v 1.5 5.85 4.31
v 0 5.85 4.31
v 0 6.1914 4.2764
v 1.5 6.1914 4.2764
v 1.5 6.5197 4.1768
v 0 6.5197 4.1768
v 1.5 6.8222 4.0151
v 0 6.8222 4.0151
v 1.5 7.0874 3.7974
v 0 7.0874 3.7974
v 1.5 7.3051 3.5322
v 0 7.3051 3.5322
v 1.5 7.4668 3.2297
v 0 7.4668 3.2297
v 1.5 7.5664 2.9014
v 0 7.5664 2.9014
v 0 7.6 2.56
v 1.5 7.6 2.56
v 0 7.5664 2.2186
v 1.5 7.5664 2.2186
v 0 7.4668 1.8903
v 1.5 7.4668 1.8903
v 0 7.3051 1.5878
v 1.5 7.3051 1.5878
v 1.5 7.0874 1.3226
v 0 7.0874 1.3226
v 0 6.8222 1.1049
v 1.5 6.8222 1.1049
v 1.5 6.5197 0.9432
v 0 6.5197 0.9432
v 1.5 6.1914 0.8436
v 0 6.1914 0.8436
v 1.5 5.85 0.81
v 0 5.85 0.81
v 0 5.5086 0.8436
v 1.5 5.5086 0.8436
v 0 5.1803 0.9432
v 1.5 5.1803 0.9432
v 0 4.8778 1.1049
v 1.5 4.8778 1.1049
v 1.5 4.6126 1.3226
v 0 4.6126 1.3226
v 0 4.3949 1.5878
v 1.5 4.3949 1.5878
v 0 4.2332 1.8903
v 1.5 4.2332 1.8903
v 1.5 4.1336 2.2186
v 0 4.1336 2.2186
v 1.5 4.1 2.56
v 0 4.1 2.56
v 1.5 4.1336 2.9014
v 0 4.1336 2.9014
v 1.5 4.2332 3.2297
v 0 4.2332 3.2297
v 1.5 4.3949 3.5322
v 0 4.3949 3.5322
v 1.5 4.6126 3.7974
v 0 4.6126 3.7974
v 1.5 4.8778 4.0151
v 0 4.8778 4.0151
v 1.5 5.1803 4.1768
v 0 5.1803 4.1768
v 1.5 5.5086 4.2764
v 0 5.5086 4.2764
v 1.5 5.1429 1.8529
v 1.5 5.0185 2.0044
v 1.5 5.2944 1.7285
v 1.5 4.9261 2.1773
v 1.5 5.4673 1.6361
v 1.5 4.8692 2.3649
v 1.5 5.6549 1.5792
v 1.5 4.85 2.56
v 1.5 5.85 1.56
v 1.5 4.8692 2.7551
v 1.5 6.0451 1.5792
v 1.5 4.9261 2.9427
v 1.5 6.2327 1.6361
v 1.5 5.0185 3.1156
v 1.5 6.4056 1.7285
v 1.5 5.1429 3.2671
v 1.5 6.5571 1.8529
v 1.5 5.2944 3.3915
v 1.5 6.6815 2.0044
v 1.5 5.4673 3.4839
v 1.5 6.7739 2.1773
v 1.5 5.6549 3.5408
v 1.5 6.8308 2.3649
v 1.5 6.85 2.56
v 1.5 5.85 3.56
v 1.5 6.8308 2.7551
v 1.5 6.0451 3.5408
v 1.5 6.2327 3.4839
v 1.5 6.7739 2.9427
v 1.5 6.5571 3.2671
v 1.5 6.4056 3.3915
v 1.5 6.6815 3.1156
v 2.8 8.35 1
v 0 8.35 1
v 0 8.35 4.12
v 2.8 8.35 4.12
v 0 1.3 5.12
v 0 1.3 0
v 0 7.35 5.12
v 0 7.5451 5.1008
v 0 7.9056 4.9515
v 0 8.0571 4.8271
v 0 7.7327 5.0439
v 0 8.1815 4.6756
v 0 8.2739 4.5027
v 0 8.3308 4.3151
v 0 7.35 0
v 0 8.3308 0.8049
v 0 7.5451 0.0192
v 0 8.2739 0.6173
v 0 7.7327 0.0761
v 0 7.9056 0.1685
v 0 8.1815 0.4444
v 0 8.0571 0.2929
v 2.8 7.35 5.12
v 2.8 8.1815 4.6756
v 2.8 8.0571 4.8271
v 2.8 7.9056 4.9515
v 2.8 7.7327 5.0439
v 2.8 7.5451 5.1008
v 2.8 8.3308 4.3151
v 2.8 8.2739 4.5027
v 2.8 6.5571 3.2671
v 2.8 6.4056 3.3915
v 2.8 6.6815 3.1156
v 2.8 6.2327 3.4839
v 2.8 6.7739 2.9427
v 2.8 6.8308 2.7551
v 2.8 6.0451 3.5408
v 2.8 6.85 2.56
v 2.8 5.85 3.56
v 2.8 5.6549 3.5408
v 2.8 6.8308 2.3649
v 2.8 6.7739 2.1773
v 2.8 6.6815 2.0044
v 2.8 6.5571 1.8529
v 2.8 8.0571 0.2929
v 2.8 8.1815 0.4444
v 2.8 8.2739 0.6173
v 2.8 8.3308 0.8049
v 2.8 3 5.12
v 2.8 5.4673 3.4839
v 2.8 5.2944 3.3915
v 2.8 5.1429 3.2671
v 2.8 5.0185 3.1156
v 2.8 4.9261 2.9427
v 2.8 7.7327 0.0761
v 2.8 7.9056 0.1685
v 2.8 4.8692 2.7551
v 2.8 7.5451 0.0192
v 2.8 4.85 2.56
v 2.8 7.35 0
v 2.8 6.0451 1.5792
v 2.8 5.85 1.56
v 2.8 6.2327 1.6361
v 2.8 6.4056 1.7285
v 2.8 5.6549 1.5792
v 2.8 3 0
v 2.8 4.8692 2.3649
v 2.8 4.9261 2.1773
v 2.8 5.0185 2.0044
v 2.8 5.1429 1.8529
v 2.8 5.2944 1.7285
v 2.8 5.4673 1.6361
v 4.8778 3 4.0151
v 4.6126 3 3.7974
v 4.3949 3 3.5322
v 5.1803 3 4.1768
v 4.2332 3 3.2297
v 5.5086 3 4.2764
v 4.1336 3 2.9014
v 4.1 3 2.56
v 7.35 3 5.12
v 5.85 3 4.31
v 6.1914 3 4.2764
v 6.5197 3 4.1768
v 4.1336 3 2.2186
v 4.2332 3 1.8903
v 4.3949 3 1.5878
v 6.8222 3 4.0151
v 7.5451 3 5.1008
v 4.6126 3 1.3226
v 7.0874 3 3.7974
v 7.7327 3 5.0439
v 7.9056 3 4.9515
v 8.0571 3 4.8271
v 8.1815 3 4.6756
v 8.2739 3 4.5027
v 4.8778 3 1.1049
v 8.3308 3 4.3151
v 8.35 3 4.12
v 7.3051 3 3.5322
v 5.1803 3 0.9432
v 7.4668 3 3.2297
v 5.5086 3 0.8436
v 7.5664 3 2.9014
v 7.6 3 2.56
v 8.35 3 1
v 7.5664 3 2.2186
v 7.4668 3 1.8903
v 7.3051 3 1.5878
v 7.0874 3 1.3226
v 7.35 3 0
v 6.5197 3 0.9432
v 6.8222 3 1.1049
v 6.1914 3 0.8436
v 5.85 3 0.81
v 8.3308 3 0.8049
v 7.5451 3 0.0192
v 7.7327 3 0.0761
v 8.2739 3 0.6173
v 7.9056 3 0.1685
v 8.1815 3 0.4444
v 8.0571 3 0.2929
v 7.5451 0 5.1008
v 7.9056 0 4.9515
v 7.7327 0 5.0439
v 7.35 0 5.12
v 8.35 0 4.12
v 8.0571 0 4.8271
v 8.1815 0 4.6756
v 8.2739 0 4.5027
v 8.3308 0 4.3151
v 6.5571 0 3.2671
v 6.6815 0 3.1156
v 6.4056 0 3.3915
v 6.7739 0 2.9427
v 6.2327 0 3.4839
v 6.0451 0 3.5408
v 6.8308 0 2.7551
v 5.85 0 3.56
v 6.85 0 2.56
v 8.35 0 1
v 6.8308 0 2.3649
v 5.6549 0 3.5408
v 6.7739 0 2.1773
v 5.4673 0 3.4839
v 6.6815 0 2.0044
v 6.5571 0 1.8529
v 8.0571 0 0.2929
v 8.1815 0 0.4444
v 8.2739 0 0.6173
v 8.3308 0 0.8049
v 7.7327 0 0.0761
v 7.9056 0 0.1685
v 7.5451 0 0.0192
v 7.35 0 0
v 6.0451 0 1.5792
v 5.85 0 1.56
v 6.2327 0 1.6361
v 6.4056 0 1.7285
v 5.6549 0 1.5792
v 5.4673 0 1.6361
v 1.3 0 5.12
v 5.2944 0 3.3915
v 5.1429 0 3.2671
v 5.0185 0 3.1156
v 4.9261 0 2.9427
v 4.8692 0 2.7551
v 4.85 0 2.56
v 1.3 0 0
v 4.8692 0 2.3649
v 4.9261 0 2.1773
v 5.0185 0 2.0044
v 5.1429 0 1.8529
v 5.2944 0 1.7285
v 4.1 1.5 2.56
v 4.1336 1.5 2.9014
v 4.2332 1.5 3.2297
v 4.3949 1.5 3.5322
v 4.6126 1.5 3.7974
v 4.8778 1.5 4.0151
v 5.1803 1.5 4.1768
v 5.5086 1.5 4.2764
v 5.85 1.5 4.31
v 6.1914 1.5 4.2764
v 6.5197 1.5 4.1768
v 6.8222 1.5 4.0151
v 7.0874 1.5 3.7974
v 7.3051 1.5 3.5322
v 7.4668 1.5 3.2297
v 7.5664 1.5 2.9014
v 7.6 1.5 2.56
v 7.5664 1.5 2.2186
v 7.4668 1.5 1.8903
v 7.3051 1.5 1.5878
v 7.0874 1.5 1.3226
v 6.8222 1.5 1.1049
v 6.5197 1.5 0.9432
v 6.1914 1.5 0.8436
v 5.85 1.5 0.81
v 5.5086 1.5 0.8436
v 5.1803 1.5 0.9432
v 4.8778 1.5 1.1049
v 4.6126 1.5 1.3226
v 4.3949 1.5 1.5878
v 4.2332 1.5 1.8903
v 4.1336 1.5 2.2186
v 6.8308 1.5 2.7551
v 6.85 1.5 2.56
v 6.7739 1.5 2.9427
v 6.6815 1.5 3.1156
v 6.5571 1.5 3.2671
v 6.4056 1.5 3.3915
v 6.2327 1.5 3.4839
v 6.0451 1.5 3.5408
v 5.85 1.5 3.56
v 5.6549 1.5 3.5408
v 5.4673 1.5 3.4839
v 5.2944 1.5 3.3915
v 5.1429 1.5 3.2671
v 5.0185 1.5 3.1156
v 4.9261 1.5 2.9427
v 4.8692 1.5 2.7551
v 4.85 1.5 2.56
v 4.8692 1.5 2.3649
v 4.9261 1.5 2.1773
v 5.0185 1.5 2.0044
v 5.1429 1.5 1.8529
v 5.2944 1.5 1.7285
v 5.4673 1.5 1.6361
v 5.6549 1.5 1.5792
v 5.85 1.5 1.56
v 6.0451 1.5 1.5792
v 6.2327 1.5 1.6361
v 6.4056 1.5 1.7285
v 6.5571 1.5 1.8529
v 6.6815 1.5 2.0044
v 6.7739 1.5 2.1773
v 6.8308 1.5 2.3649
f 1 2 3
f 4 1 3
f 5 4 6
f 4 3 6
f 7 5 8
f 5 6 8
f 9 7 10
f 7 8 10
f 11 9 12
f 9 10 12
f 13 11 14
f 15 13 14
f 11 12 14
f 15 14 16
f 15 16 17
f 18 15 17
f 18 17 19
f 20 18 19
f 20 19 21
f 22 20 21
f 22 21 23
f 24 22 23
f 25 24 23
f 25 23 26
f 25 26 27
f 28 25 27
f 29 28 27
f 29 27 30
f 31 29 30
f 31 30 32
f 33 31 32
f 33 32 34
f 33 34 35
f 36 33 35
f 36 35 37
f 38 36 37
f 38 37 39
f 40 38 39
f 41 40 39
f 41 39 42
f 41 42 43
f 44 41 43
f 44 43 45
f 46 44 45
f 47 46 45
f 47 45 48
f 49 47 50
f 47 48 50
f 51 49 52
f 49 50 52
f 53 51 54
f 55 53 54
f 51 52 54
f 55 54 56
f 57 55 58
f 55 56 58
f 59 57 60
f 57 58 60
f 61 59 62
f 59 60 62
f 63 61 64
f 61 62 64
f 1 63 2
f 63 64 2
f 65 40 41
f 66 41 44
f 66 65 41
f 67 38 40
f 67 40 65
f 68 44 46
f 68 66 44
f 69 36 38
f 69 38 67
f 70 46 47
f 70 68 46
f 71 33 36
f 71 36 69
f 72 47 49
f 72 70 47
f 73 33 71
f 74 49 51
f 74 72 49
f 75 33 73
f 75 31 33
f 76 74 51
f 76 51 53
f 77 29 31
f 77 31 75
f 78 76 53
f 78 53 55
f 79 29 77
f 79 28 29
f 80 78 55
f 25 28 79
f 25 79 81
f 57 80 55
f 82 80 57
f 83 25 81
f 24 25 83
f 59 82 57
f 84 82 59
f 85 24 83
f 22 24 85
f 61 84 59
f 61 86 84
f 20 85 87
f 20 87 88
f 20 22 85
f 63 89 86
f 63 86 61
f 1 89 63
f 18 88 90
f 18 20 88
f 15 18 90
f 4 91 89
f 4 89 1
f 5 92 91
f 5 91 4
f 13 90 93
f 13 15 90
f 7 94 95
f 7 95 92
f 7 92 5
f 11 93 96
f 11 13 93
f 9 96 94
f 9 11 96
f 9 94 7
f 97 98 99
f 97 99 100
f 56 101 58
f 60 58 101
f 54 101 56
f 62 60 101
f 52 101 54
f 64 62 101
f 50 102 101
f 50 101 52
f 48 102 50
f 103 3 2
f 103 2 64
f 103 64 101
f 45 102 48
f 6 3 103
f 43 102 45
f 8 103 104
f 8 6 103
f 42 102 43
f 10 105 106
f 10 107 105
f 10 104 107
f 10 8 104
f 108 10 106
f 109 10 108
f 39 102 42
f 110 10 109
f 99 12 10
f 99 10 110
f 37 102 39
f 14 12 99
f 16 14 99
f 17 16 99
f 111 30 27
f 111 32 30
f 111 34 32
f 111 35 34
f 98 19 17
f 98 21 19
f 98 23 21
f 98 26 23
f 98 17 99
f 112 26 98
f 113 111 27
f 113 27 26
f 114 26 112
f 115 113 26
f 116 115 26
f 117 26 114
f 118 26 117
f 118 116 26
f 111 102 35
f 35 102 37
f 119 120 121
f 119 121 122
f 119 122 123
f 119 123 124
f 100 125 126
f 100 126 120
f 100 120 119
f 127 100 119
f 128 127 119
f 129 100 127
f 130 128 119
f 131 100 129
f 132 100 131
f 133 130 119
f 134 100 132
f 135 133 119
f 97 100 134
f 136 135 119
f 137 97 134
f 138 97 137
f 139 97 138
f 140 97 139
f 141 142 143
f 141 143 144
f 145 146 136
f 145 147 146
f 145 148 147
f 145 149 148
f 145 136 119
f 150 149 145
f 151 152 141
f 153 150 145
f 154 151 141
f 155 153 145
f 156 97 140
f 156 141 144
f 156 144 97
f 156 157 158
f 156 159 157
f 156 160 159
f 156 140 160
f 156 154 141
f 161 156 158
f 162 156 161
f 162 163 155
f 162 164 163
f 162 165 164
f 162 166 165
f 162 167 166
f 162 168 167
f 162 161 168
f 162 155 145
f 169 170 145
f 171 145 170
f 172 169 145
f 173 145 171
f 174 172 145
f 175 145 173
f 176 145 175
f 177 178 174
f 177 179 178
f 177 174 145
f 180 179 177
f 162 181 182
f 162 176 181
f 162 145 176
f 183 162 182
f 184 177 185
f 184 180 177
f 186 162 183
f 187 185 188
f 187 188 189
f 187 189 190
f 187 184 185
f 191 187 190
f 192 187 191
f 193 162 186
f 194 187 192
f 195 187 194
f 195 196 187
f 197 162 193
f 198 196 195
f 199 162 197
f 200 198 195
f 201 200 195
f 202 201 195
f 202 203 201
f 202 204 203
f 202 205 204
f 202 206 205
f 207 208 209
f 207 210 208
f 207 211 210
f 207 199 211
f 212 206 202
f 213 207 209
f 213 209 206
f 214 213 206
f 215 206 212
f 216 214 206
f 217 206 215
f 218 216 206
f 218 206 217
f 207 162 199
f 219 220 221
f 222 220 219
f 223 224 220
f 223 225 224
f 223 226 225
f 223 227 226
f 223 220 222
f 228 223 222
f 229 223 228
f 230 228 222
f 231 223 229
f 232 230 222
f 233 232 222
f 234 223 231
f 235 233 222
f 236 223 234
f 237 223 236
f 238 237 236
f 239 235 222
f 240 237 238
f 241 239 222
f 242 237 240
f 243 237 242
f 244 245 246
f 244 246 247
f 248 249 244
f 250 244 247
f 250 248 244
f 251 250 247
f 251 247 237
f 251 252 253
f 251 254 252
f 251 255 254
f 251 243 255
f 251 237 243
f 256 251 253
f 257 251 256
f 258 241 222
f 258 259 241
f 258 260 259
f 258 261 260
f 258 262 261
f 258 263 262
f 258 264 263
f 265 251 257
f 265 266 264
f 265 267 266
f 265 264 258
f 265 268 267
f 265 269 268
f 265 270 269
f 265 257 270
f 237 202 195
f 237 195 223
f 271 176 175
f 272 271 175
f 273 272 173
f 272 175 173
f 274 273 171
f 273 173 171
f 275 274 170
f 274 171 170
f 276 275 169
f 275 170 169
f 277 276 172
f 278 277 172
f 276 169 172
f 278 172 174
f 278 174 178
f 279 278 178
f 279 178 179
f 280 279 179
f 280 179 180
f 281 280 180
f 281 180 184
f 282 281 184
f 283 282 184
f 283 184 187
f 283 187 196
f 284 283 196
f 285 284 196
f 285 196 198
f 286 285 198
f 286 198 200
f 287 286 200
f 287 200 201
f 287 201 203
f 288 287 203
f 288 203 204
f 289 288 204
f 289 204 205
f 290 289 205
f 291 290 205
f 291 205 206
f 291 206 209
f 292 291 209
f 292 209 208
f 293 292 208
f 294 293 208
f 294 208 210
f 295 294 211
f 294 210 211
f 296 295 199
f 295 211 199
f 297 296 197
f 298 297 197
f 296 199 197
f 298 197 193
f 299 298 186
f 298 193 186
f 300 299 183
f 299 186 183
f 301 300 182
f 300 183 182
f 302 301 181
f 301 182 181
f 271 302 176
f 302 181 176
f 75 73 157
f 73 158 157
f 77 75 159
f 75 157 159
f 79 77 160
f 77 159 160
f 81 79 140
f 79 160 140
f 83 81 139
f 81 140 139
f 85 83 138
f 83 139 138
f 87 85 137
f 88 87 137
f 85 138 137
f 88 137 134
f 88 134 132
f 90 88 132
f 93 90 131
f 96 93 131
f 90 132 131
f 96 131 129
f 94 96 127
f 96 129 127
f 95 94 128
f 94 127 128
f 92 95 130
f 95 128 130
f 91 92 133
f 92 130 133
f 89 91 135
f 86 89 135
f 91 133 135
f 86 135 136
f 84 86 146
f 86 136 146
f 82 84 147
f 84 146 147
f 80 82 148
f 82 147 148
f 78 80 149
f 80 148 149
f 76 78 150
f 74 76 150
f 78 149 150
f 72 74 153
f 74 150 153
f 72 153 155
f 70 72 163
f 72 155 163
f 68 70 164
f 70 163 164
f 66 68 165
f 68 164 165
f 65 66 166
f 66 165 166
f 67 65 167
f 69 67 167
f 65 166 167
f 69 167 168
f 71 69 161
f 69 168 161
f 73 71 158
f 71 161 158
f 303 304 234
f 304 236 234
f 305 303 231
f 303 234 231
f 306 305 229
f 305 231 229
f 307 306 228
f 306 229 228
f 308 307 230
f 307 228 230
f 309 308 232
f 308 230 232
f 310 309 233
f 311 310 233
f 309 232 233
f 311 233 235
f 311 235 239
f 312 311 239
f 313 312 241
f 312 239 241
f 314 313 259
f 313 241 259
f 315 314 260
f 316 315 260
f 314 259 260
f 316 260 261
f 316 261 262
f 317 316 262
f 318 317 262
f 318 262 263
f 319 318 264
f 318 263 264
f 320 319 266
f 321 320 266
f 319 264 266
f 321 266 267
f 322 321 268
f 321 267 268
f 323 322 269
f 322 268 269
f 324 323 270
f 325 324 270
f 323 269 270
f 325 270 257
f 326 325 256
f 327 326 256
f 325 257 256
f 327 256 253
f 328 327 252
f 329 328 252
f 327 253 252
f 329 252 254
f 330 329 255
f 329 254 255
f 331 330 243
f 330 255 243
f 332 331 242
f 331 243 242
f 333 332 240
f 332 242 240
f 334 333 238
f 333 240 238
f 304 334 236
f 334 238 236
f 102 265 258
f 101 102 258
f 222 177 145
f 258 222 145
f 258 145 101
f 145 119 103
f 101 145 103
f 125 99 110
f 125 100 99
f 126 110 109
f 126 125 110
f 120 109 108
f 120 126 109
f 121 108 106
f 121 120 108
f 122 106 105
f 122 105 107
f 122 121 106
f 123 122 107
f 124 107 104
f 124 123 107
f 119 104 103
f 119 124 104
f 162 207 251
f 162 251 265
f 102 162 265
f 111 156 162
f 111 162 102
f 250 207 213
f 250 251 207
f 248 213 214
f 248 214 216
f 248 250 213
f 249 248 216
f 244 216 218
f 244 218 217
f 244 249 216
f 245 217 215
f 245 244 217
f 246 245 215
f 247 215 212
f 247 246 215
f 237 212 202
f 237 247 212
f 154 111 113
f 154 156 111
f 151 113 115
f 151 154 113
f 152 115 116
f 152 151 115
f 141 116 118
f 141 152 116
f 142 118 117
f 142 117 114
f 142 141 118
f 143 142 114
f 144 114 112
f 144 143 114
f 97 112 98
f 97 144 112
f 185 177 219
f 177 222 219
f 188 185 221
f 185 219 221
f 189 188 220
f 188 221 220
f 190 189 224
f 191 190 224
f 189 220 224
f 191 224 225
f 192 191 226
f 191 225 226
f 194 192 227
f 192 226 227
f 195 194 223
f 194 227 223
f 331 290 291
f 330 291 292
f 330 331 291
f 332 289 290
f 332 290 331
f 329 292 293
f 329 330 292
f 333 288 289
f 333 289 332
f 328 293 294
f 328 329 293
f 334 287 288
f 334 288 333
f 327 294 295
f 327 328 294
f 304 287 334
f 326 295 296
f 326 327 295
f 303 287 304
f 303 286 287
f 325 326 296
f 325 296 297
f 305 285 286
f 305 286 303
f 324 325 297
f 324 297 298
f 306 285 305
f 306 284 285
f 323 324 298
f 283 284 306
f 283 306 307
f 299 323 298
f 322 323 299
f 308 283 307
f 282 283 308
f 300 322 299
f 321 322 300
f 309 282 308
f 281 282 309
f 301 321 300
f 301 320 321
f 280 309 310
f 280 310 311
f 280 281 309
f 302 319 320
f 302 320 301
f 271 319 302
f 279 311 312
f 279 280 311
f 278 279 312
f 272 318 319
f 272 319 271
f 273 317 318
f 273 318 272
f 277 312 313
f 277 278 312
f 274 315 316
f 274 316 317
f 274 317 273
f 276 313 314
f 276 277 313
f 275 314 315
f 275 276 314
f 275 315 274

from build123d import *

# Parameters (mm, degrees)
BOSS_EXTRU_1_DEPTH                                 = 5.12
CHAMBRAGE_POUR_VIS_T_TE_HEXAGONALE_M21_D           = 2
CHAMBRAGE_POUR_VIS_T_TE_HEXAGONALE_M21_CBORE_D     = 3.5
CHAMBRAGE_POUR_VIS_T_TE_HEXAGONALE_M21_CBORE_DEPTH = 1.5
CHAMBRAGE_POUR_VIS_T_TE_HEXAGONALE_M22_D           = 2
CHAMBRAGE_POUR_VIS_T_TE_HEXAGONALE_M22_CBORE_D     = 3.5
CHAMBRAGE_POUR_VIS_T_TE_HEXAGONALE_M22_CBORE_DEPTH = 1.5
CHANFREIN1_SIZE                                    = 1.3
CONG_1_R                                           = 1


with BuildPart() as part:
    # Esquisse1 → Boss.-Extru.1 (new body)
    with BuildSketch(Plane.XY):
        Polygon((0, 0), (0, 8.35), (2.8, 8.35), (2.8, 3), (8.35, 3), (8.35, 0), align=None)
    extrude(amount=BOSS_EXTRU_1_DEPTH)

    # Chambrage pour vis à tête hexagonale M21 (through all)
    with Locations(Plane(origin=(0, 3, 0), x_dir=(-1, 0, 0), z_dir=(0, 1, 0))):
        with Locations((-5.85, 2.56)):
            CounterBoreHole(CHAMBRAGE_POUR_VIS_T_TE_HEXAGONALE_M21_D / 2, CHAMBRAGE_POUR_VIS_T_TE_HEXAGONALE_M21_CBORE_D / 2, CHAMBRAGE_POUR_VIS_T_TE_HEXAGONALE_M21_CBORE_DEPTH)

    # Chambrage pour vis à tête hexagonale M22 (through all)
    with Locations(Plane.ZY):
        with Locations((2.56, 5.85)):
            CounterBoreHole(CHAMBRAGE_POUR_VIS_T_TE_HEXAGONALE_M22_D / 2, CHAMBRAGE_POUR_VIS_T_TE_HEXAGONALE_M22_CBORE_D / 2, CHAMBRAGE_POUR_VIS_T_TE_HEXAGONALE_M22_CBORE_DEPTH)

    # Chanfrein1
    chanfrein1_edges = [part.edges().sort_by_distance(p)[0] for p in [
        (0, 0, 2.56),
    ]]
    chamfer(chanfrein1_edges, length=CHANFREIN1_SIZE)

    # Congé1
    cong_1_edges = [part.edges().sort_by_distance(p)[0] for p in [
        (1.4, 8.35, 5.12),
        (1.4, 8.35, 0),
        (8.35, 1.5, 5.12),
        (8.35, 1.5, 0),
    ]]
    fillet(cong_1_edges, radius=CONG_1_R)


solid = part.part
